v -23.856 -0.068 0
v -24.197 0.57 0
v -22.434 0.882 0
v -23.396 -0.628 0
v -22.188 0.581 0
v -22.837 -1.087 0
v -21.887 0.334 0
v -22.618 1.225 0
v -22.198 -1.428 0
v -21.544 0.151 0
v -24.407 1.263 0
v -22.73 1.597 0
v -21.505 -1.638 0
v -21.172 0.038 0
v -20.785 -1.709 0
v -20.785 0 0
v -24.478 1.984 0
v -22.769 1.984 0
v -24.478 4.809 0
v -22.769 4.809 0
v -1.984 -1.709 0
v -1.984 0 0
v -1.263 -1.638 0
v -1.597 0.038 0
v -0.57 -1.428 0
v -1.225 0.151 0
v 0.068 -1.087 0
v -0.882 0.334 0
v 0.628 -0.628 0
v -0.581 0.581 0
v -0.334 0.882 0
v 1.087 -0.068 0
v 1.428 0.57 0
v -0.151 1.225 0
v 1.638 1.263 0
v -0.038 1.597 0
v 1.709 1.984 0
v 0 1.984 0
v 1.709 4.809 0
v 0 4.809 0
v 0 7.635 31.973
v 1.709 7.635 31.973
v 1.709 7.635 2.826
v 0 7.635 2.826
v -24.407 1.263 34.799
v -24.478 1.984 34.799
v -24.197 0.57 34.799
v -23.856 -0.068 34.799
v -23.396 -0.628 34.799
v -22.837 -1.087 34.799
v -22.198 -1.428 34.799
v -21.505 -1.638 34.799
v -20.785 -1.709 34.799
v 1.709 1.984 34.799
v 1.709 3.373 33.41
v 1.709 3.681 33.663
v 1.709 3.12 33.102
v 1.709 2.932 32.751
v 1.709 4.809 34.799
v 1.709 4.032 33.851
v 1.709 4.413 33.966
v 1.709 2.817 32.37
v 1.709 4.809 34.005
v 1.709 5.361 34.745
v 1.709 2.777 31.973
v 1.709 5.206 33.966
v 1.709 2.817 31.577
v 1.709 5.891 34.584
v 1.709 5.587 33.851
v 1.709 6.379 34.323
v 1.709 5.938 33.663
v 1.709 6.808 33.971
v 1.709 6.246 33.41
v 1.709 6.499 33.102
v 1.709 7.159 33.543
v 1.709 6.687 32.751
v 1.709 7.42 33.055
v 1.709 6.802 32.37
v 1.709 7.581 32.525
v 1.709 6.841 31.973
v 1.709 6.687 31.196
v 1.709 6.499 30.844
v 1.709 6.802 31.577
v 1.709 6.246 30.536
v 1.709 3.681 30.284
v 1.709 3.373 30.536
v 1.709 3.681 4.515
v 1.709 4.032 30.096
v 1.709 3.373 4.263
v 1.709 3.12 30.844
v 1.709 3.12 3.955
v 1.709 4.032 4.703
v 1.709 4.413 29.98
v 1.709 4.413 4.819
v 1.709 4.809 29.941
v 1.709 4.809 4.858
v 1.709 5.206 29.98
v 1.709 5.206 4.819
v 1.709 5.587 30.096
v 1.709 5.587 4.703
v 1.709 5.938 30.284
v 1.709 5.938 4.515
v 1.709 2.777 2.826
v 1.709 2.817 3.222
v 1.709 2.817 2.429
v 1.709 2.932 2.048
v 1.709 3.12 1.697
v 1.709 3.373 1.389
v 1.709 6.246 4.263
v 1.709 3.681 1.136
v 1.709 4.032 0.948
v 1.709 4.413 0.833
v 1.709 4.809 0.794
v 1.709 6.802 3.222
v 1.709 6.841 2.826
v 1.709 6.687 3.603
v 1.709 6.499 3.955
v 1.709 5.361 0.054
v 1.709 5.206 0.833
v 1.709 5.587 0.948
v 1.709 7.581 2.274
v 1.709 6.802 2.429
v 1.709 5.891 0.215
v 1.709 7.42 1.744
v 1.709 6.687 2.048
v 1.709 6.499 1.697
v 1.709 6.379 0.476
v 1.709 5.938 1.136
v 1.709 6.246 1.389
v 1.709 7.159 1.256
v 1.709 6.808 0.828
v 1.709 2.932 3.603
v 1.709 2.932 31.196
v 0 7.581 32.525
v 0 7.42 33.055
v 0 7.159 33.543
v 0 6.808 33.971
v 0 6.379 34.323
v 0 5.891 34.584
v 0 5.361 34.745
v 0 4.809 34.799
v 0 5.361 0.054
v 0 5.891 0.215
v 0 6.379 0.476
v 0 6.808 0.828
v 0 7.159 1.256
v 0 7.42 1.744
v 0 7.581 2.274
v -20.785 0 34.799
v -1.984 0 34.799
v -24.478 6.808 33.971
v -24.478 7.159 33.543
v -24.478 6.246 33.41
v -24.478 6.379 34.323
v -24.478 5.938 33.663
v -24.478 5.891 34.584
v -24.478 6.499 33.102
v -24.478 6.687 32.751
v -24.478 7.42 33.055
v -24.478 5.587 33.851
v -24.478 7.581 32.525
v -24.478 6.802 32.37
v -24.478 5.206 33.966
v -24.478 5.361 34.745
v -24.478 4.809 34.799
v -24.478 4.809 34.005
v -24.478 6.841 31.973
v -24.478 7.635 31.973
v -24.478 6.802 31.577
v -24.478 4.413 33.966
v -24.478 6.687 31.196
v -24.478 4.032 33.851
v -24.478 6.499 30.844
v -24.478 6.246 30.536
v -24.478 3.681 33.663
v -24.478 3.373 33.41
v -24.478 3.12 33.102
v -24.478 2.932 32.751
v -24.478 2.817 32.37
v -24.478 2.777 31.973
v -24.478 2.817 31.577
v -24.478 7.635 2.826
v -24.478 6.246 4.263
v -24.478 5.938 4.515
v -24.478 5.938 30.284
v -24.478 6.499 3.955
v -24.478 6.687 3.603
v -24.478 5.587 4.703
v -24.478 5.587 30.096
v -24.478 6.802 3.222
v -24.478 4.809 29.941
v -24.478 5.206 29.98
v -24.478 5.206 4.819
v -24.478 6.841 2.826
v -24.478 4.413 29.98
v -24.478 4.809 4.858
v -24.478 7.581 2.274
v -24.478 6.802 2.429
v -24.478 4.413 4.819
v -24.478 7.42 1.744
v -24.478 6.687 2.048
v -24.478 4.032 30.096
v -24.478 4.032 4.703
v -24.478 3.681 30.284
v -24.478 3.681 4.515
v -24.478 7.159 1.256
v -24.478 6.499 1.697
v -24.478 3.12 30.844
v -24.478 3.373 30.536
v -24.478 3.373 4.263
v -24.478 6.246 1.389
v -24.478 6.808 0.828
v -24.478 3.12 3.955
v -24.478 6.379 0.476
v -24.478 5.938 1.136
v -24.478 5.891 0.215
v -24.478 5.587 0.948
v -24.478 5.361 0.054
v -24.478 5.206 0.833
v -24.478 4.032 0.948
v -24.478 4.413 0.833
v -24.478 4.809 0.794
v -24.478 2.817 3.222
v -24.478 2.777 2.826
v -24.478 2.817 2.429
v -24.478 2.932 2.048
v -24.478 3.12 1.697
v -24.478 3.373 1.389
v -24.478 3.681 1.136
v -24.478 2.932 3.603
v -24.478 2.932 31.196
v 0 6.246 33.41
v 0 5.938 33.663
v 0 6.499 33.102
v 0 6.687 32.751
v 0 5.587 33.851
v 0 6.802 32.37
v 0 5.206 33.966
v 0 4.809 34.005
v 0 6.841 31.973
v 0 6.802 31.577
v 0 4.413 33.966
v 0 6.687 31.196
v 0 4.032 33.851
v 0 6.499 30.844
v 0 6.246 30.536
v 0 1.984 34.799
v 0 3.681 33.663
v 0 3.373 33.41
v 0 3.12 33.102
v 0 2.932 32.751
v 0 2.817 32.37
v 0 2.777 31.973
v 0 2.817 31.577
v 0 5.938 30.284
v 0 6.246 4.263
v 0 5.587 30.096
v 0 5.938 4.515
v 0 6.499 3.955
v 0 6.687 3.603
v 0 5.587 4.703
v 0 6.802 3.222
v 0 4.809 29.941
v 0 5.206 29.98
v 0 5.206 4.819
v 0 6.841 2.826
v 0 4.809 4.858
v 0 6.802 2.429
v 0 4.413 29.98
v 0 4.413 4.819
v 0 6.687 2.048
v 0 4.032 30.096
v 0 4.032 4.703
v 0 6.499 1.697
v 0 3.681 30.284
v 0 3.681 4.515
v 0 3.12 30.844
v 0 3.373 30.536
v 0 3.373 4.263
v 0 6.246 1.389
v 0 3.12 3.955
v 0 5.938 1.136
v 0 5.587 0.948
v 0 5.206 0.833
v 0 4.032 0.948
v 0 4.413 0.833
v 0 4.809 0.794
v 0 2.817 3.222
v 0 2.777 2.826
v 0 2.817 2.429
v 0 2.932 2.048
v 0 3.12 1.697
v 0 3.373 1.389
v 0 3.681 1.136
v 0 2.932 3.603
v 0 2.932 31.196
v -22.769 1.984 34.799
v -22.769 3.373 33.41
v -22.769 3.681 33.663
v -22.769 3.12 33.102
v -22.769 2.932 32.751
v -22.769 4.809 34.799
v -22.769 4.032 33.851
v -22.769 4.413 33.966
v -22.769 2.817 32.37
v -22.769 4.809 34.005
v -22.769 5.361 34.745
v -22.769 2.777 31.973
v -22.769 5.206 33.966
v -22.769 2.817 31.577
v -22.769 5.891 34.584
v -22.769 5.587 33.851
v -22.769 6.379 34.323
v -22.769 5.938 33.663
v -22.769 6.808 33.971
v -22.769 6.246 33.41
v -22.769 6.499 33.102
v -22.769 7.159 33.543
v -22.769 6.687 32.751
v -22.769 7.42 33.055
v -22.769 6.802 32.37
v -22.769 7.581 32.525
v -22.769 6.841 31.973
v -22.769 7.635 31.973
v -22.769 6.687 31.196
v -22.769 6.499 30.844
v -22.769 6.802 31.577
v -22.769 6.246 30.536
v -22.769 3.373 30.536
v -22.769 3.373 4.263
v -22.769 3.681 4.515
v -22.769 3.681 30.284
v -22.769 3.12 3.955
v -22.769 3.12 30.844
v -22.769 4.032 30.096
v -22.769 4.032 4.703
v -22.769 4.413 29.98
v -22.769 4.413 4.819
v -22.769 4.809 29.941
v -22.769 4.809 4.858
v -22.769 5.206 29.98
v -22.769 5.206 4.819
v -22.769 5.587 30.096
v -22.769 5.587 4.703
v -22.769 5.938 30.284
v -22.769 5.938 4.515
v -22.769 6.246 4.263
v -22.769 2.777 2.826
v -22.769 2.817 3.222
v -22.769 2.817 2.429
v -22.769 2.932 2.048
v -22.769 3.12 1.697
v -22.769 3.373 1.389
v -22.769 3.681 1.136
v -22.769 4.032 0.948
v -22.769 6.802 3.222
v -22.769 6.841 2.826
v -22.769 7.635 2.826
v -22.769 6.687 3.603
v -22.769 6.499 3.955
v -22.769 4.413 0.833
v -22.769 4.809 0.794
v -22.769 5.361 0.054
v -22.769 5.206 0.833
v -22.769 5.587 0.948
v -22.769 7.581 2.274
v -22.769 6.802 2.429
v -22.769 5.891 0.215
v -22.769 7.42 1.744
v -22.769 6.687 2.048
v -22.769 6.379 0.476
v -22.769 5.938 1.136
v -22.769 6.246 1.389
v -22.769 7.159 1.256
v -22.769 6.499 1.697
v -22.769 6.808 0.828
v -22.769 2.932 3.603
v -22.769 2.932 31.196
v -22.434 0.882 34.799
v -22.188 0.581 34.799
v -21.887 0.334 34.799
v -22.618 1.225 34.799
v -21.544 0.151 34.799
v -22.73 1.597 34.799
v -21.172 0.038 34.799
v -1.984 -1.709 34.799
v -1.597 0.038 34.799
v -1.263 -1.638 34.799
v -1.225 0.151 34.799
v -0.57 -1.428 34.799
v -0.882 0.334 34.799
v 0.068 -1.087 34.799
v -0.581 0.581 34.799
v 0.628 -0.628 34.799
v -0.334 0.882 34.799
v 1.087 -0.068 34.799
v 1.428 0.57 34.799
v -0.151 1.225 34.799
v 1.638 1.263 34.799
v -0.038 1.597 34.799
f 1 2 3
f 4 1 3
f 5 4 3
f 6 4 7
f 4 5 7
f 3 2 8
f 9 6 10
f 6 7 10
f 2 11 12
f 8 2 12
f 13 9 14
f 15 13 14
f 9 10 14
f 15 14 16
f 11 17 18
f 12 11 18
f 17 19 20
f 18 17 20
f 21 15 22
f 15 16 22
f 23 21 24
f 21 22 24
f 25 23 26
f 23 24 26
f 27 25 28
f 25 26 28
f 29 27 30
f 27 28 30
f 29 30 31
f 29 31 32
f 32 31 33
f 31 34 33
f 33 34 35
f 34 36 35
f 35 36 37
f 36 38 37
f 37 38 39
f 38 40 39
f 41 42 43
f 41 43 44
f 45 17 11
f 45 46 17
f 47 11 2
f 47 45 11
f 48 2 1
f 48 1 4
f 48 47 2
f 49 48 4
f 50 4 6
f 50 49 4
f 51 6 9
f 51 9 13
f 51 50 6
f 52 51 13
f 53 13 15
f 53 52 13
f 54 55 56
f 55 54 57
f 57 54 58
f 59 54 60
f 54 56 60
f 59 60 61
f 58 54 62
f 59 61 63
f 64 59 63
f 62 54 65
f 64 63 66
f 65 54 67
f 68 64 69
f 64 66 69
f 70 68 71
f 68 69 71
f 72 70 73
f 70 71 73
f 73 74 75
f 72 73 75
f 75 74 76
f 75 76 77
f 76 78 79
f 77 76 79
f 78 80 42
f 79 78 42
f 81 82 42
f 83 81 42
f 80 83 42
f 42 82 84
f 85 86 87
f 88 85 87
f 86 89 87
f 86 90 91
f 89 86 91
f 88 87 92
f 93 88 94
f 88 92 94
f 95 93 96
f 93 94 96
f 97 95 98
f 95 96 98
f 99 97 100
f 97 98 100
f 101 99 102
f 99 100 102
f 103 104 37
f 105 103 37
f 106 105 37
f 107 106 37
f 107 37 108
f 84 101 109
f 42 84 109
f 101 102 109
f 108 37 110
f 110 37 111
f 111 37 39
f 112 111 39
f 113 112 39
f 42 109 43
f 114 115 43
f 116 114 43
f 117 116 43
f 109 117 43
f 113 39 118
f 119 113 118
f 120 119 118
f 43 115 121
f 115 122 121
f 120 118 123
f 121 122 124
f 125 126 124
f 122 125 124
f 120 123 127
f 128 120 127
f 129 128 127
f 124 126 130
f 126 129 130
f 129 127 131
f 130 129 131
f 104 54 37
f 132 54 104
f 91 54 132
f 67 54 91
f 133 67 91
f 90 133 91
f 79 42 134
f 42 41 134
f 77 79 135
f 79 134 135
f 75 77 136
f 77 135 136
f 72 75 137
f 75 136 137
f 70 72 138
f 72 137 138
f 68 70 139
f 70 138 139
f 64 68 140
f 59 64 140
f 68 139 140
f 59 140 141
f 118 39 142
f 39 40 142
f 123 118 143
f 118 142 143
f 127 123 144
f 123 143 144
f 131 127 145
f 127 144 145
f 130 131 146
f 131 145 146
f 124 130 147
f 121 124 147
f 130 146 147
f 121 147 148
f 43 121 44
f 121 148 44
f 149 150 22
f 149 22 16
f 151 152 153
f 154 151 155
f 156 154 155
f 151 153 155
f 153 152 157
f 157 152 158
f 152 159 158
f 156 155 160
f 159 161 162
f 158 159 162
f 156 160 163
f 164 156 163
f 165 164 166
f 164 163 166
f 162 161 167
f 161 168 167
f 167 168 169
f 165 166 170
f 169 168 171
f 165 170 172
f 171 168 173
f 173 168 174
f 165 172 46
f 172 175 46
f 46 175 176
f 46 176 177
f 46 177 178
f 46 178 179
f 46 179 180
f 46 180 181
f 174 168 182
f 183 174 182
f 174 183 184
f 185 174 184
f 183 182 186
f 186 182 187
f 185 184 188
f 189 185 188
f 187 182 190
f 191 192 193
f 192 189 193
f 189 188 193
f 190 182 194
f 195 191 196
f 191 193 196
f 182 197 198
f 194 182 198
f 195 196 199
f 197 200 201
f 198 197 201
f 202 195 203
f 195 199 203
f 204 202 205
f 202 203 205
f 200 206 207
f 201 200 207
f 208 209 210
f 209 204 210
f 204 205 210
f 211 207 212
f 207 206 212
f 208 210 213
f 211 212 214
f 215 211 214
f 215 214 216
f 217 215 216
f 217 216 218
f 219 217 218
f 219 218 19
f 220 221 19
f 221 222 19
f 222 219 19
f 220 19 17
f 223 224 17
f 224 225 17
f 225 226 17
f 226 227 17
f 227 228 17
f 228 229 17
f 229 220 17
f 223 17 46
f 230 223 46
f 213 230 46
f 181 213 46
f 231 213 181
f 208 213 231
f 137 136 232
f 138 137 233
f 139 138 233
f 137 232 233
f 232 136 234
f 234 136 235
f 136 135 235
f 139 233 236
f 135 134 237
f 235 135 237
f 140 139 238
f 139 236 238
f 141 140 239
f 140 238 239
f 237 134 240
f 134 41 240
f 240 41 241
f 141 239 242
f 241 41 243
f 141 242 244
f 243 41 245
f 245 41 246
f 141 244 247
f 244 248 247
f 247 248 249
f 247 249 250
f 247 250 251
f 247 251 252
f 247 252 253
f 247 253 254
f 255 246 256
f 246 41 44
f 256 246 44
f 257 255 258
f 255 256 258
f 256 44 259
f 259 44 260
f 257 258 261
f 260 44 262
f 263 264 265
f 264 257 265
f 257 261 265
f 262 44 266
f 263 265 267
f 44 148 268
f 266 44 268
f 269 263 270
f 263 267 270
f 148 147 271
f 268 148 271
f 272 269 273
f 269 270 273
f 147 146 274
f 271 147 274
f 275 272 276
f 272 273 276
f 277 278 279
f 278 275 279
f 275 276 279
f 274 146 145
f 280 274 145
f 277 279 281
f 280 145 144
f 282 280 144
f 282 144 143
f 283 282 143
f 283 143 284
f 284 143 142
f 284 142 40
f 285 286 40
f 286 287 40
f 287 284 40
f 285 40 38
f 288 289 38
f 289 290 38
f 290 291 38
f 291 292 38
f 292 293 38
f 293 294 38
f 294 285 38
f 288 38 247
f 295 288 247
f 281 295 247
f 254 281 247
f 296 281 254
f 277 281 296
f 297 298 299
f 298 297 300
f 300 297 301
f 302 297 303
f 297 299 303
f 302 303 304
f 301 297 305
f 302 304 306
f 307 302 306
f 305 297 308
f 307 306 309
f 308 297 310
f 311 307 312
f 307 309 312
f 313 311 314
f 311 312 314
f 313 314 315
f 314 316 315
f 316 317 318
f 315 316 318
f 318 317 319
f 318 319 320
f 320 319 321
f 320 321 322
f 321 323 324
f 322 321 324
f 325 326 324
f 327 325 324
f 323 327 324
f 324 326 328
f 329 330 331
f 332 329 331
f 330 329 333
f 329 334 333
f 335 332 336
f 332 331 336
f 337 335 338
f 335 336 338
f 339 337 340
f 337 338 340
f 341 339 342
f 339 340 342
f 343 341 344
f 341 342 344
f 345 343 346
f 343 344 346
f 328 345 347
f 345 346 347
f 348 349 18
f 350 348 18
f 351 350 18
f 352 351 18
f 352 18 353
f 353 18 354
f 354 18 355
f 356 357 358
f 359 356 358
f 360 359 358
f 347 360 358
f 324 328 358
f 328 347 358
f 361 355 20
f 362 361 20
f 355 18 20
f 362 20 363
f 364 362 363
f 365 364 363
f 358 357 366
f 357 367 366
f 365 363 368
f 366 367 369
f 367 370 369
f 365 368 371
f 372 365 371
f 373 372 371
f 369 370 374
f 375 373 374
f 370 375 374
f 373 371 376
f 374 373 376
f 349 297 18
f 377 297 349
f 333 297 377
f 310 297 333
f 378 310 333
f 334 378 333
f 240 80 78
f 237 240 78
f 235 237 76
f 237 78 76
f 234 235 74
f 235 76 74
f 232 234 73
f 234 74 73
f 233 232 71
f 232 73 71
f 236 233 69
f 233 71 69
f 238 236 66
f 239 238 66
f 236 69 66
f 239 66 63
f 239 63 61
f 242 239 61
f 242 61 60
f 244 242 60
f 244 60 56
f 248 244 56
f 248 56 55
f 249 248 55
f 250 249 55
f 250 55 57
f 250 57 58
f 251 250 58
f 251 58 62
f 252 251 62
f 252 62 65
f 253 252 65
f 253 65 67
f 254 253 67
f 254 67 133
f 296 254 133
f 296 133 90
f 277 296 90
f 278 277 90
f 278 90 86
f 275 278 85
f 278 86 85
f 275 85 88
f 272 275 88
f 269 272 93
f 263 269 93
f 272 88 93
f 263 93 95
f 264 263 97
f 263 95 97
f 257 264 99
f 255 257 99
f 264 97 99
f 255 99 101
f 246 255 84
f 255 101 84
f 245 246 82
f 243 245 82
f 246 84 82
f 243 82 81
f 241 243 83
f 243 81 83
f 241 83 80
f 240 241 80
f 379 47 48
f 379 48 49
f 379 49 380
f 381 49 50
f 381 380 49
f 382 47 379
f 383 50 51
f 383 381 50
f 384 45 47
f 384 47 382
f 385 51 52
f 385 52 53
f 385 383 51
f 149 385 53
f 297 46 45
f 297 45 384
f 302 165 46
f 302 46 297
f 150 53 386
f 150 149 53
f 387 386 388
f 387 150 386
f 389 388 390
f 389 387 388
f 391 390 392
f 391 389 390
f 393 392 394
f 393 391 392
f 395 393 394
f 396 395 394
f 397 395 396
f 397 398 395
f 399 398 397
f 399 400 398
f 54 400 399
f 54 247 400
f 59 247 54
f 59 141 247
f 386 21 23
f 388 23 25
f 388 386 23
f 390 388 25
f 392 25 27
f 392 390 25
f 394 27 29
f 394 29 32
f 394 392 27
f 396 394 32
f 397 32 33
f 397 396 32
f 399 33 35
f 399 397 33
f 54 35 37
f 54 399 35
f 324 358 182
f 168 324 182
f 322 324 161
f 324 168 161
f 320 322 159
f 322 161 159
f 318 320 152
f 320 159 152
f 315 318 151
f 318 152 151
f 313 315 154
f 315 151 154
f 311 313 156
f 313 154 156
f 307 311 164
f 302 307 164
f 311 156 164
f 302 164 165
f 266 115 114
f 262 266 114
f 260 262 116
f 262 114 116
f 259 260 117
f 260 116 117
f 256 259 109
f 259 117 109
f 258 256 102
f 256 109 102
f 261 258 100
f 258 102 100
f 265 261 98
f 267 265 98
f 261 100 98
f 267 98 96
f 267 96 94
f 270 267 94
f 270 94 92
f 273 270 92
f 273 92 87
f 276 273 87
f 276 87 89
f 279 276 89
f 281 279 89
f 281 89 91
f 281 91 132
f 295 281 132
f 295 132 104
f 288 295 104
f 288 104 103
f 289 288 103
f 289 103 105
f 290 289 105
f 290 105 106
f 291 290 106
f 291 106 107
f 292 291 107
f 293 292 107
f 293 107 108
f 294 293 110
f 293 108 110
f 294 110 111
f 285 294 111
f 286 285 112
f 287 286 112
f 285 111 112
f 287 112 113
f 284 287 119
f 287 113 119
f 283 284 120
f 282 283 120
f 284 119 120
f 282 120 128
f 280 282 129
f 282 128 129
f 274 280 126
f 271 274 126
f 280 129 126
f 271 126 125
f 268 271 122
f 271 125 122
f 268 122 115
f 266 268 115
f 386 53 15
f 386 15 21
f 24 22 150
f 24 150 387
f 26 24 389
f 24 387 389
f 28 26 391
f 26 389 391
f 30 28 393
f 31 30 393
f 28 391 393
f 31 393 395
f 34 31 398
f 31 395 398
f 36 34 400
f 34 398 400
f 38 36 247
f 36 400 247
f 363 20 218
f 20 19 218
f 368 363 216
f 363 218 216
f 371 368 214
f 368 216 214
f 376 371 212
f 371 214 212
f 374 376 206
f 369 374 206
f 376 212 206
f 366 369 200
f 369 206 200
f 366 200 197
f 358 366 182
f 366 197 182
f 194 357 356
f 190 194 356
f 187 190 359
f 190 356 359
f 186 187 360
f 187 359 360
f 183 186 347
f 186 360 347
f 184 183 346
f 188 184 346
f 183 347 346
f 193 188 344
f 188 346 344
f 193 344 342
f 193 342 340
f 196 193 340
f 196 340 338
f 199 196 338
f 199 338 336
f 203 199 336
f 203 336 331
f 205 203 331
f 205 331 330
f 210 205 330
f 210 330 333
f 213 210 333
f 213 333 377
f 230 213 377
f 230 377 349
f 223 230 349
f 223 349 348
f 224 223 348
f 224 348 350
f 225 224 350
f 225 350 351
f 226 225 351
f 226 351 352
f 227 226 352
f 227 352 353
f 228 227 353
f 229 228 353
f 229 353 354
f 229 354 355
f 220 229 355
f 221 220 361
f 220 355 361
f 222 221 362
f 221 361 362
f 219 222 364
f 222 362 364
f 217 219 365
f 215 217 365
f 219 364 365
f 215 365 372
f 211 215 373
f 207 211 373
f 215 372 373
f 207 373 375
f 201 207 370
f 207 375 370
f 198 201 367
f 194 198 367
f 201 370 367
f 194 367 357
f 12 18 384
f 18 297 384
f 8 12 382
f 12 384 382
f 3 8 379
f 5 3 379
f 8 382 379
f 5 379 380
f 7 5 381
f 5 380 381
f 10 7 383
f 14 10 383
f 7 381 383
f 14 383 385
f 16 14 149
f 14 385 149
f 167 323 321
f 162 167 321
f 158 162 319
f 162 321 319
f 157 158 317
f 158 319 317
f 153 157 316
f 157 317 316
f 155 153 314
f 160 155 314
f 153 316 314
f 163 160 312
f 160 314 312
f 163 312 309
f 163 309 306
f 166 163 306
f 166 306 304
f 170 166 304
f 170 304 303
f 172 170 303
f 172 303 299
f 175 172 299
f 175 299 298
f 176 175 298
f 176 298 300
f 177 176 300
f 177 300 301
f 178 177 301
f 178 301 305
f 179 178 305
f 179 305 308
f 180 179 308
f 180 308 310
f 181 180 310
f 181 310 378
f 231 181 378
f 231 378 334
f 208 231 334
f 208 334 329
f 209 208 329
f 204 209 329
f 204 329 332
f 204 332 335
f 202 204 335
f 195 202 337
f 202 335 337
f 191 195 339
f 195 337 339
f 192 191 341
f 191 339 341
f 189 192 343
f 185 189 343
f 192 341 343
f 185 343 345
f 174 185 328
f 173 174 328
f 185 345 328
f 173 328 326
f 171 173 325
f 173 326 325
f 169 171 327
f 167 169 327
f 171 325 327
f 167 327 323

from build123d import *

# Parameters (mm, degrees)
F1_DEPTH = 34.7990414
F2_R     = 3.69316
F3_R     = 1.98374
F4_R     = 2.032
F5_DEPTH = 26.1874
F6_R     = 2.82575


with BuildPart() as f1:
    # F0 (on Top) → F1 (new body)
    with BuildSketch(Plane.XY):
        Polygon((0, 7.63524), (0, 0), (-22.76856, 0), (-22.76856, 7.63524), (-24.47798, 7.63524), (-24.47798, -1.70942), (1.70942, -1.70942), (1.70942, 7.63524), align=None)
    extrude(amount=F1_DEPTH)

    # F2
    f2_edges = [f1.edges().sort_by_distance(p)[0] for p in [
        (1.70942, -1.70942, 17.399521),
        (-24.47798, -1.70942, 17.399521),
    ]]
    fillet(f2_edges, radius=F2_R)

    # F3
    f3_edges = [f1.edges().sort_by_distance(p)[0] for p in [
        (0, 0, 17.399521),
        (-22.76856, 0, 17.399521),
    ]]
    fillet(f3_edges, radius=F3_R)

    # F4 (on face) → F5 (cut, through all)
    with BuildSketch(Plane.YZ.offset(1.70942)):
        with Locations((4.80949, 2.82575)):
            Circle(F4_R)
        with Locations((4.80949, 31.9732914)):
            Circle(F4_R)
    extrude(amount=-F5_DEPTH, mode=Mode.SUBTRACT)

    # F6
    f6_edges = [f1.edges().sort_by_distance(p)[0] for p in [
        (0.85471, 7.63524, 34.799041),
        (-23.62327, 7.63524, 34.799041),
        (0.85471, 7.63524, 0),
        (-23.62327, 7.63524, 0),
    ]]
    fillet(f6_edges, radius=F6_R)


solid = f1.part
